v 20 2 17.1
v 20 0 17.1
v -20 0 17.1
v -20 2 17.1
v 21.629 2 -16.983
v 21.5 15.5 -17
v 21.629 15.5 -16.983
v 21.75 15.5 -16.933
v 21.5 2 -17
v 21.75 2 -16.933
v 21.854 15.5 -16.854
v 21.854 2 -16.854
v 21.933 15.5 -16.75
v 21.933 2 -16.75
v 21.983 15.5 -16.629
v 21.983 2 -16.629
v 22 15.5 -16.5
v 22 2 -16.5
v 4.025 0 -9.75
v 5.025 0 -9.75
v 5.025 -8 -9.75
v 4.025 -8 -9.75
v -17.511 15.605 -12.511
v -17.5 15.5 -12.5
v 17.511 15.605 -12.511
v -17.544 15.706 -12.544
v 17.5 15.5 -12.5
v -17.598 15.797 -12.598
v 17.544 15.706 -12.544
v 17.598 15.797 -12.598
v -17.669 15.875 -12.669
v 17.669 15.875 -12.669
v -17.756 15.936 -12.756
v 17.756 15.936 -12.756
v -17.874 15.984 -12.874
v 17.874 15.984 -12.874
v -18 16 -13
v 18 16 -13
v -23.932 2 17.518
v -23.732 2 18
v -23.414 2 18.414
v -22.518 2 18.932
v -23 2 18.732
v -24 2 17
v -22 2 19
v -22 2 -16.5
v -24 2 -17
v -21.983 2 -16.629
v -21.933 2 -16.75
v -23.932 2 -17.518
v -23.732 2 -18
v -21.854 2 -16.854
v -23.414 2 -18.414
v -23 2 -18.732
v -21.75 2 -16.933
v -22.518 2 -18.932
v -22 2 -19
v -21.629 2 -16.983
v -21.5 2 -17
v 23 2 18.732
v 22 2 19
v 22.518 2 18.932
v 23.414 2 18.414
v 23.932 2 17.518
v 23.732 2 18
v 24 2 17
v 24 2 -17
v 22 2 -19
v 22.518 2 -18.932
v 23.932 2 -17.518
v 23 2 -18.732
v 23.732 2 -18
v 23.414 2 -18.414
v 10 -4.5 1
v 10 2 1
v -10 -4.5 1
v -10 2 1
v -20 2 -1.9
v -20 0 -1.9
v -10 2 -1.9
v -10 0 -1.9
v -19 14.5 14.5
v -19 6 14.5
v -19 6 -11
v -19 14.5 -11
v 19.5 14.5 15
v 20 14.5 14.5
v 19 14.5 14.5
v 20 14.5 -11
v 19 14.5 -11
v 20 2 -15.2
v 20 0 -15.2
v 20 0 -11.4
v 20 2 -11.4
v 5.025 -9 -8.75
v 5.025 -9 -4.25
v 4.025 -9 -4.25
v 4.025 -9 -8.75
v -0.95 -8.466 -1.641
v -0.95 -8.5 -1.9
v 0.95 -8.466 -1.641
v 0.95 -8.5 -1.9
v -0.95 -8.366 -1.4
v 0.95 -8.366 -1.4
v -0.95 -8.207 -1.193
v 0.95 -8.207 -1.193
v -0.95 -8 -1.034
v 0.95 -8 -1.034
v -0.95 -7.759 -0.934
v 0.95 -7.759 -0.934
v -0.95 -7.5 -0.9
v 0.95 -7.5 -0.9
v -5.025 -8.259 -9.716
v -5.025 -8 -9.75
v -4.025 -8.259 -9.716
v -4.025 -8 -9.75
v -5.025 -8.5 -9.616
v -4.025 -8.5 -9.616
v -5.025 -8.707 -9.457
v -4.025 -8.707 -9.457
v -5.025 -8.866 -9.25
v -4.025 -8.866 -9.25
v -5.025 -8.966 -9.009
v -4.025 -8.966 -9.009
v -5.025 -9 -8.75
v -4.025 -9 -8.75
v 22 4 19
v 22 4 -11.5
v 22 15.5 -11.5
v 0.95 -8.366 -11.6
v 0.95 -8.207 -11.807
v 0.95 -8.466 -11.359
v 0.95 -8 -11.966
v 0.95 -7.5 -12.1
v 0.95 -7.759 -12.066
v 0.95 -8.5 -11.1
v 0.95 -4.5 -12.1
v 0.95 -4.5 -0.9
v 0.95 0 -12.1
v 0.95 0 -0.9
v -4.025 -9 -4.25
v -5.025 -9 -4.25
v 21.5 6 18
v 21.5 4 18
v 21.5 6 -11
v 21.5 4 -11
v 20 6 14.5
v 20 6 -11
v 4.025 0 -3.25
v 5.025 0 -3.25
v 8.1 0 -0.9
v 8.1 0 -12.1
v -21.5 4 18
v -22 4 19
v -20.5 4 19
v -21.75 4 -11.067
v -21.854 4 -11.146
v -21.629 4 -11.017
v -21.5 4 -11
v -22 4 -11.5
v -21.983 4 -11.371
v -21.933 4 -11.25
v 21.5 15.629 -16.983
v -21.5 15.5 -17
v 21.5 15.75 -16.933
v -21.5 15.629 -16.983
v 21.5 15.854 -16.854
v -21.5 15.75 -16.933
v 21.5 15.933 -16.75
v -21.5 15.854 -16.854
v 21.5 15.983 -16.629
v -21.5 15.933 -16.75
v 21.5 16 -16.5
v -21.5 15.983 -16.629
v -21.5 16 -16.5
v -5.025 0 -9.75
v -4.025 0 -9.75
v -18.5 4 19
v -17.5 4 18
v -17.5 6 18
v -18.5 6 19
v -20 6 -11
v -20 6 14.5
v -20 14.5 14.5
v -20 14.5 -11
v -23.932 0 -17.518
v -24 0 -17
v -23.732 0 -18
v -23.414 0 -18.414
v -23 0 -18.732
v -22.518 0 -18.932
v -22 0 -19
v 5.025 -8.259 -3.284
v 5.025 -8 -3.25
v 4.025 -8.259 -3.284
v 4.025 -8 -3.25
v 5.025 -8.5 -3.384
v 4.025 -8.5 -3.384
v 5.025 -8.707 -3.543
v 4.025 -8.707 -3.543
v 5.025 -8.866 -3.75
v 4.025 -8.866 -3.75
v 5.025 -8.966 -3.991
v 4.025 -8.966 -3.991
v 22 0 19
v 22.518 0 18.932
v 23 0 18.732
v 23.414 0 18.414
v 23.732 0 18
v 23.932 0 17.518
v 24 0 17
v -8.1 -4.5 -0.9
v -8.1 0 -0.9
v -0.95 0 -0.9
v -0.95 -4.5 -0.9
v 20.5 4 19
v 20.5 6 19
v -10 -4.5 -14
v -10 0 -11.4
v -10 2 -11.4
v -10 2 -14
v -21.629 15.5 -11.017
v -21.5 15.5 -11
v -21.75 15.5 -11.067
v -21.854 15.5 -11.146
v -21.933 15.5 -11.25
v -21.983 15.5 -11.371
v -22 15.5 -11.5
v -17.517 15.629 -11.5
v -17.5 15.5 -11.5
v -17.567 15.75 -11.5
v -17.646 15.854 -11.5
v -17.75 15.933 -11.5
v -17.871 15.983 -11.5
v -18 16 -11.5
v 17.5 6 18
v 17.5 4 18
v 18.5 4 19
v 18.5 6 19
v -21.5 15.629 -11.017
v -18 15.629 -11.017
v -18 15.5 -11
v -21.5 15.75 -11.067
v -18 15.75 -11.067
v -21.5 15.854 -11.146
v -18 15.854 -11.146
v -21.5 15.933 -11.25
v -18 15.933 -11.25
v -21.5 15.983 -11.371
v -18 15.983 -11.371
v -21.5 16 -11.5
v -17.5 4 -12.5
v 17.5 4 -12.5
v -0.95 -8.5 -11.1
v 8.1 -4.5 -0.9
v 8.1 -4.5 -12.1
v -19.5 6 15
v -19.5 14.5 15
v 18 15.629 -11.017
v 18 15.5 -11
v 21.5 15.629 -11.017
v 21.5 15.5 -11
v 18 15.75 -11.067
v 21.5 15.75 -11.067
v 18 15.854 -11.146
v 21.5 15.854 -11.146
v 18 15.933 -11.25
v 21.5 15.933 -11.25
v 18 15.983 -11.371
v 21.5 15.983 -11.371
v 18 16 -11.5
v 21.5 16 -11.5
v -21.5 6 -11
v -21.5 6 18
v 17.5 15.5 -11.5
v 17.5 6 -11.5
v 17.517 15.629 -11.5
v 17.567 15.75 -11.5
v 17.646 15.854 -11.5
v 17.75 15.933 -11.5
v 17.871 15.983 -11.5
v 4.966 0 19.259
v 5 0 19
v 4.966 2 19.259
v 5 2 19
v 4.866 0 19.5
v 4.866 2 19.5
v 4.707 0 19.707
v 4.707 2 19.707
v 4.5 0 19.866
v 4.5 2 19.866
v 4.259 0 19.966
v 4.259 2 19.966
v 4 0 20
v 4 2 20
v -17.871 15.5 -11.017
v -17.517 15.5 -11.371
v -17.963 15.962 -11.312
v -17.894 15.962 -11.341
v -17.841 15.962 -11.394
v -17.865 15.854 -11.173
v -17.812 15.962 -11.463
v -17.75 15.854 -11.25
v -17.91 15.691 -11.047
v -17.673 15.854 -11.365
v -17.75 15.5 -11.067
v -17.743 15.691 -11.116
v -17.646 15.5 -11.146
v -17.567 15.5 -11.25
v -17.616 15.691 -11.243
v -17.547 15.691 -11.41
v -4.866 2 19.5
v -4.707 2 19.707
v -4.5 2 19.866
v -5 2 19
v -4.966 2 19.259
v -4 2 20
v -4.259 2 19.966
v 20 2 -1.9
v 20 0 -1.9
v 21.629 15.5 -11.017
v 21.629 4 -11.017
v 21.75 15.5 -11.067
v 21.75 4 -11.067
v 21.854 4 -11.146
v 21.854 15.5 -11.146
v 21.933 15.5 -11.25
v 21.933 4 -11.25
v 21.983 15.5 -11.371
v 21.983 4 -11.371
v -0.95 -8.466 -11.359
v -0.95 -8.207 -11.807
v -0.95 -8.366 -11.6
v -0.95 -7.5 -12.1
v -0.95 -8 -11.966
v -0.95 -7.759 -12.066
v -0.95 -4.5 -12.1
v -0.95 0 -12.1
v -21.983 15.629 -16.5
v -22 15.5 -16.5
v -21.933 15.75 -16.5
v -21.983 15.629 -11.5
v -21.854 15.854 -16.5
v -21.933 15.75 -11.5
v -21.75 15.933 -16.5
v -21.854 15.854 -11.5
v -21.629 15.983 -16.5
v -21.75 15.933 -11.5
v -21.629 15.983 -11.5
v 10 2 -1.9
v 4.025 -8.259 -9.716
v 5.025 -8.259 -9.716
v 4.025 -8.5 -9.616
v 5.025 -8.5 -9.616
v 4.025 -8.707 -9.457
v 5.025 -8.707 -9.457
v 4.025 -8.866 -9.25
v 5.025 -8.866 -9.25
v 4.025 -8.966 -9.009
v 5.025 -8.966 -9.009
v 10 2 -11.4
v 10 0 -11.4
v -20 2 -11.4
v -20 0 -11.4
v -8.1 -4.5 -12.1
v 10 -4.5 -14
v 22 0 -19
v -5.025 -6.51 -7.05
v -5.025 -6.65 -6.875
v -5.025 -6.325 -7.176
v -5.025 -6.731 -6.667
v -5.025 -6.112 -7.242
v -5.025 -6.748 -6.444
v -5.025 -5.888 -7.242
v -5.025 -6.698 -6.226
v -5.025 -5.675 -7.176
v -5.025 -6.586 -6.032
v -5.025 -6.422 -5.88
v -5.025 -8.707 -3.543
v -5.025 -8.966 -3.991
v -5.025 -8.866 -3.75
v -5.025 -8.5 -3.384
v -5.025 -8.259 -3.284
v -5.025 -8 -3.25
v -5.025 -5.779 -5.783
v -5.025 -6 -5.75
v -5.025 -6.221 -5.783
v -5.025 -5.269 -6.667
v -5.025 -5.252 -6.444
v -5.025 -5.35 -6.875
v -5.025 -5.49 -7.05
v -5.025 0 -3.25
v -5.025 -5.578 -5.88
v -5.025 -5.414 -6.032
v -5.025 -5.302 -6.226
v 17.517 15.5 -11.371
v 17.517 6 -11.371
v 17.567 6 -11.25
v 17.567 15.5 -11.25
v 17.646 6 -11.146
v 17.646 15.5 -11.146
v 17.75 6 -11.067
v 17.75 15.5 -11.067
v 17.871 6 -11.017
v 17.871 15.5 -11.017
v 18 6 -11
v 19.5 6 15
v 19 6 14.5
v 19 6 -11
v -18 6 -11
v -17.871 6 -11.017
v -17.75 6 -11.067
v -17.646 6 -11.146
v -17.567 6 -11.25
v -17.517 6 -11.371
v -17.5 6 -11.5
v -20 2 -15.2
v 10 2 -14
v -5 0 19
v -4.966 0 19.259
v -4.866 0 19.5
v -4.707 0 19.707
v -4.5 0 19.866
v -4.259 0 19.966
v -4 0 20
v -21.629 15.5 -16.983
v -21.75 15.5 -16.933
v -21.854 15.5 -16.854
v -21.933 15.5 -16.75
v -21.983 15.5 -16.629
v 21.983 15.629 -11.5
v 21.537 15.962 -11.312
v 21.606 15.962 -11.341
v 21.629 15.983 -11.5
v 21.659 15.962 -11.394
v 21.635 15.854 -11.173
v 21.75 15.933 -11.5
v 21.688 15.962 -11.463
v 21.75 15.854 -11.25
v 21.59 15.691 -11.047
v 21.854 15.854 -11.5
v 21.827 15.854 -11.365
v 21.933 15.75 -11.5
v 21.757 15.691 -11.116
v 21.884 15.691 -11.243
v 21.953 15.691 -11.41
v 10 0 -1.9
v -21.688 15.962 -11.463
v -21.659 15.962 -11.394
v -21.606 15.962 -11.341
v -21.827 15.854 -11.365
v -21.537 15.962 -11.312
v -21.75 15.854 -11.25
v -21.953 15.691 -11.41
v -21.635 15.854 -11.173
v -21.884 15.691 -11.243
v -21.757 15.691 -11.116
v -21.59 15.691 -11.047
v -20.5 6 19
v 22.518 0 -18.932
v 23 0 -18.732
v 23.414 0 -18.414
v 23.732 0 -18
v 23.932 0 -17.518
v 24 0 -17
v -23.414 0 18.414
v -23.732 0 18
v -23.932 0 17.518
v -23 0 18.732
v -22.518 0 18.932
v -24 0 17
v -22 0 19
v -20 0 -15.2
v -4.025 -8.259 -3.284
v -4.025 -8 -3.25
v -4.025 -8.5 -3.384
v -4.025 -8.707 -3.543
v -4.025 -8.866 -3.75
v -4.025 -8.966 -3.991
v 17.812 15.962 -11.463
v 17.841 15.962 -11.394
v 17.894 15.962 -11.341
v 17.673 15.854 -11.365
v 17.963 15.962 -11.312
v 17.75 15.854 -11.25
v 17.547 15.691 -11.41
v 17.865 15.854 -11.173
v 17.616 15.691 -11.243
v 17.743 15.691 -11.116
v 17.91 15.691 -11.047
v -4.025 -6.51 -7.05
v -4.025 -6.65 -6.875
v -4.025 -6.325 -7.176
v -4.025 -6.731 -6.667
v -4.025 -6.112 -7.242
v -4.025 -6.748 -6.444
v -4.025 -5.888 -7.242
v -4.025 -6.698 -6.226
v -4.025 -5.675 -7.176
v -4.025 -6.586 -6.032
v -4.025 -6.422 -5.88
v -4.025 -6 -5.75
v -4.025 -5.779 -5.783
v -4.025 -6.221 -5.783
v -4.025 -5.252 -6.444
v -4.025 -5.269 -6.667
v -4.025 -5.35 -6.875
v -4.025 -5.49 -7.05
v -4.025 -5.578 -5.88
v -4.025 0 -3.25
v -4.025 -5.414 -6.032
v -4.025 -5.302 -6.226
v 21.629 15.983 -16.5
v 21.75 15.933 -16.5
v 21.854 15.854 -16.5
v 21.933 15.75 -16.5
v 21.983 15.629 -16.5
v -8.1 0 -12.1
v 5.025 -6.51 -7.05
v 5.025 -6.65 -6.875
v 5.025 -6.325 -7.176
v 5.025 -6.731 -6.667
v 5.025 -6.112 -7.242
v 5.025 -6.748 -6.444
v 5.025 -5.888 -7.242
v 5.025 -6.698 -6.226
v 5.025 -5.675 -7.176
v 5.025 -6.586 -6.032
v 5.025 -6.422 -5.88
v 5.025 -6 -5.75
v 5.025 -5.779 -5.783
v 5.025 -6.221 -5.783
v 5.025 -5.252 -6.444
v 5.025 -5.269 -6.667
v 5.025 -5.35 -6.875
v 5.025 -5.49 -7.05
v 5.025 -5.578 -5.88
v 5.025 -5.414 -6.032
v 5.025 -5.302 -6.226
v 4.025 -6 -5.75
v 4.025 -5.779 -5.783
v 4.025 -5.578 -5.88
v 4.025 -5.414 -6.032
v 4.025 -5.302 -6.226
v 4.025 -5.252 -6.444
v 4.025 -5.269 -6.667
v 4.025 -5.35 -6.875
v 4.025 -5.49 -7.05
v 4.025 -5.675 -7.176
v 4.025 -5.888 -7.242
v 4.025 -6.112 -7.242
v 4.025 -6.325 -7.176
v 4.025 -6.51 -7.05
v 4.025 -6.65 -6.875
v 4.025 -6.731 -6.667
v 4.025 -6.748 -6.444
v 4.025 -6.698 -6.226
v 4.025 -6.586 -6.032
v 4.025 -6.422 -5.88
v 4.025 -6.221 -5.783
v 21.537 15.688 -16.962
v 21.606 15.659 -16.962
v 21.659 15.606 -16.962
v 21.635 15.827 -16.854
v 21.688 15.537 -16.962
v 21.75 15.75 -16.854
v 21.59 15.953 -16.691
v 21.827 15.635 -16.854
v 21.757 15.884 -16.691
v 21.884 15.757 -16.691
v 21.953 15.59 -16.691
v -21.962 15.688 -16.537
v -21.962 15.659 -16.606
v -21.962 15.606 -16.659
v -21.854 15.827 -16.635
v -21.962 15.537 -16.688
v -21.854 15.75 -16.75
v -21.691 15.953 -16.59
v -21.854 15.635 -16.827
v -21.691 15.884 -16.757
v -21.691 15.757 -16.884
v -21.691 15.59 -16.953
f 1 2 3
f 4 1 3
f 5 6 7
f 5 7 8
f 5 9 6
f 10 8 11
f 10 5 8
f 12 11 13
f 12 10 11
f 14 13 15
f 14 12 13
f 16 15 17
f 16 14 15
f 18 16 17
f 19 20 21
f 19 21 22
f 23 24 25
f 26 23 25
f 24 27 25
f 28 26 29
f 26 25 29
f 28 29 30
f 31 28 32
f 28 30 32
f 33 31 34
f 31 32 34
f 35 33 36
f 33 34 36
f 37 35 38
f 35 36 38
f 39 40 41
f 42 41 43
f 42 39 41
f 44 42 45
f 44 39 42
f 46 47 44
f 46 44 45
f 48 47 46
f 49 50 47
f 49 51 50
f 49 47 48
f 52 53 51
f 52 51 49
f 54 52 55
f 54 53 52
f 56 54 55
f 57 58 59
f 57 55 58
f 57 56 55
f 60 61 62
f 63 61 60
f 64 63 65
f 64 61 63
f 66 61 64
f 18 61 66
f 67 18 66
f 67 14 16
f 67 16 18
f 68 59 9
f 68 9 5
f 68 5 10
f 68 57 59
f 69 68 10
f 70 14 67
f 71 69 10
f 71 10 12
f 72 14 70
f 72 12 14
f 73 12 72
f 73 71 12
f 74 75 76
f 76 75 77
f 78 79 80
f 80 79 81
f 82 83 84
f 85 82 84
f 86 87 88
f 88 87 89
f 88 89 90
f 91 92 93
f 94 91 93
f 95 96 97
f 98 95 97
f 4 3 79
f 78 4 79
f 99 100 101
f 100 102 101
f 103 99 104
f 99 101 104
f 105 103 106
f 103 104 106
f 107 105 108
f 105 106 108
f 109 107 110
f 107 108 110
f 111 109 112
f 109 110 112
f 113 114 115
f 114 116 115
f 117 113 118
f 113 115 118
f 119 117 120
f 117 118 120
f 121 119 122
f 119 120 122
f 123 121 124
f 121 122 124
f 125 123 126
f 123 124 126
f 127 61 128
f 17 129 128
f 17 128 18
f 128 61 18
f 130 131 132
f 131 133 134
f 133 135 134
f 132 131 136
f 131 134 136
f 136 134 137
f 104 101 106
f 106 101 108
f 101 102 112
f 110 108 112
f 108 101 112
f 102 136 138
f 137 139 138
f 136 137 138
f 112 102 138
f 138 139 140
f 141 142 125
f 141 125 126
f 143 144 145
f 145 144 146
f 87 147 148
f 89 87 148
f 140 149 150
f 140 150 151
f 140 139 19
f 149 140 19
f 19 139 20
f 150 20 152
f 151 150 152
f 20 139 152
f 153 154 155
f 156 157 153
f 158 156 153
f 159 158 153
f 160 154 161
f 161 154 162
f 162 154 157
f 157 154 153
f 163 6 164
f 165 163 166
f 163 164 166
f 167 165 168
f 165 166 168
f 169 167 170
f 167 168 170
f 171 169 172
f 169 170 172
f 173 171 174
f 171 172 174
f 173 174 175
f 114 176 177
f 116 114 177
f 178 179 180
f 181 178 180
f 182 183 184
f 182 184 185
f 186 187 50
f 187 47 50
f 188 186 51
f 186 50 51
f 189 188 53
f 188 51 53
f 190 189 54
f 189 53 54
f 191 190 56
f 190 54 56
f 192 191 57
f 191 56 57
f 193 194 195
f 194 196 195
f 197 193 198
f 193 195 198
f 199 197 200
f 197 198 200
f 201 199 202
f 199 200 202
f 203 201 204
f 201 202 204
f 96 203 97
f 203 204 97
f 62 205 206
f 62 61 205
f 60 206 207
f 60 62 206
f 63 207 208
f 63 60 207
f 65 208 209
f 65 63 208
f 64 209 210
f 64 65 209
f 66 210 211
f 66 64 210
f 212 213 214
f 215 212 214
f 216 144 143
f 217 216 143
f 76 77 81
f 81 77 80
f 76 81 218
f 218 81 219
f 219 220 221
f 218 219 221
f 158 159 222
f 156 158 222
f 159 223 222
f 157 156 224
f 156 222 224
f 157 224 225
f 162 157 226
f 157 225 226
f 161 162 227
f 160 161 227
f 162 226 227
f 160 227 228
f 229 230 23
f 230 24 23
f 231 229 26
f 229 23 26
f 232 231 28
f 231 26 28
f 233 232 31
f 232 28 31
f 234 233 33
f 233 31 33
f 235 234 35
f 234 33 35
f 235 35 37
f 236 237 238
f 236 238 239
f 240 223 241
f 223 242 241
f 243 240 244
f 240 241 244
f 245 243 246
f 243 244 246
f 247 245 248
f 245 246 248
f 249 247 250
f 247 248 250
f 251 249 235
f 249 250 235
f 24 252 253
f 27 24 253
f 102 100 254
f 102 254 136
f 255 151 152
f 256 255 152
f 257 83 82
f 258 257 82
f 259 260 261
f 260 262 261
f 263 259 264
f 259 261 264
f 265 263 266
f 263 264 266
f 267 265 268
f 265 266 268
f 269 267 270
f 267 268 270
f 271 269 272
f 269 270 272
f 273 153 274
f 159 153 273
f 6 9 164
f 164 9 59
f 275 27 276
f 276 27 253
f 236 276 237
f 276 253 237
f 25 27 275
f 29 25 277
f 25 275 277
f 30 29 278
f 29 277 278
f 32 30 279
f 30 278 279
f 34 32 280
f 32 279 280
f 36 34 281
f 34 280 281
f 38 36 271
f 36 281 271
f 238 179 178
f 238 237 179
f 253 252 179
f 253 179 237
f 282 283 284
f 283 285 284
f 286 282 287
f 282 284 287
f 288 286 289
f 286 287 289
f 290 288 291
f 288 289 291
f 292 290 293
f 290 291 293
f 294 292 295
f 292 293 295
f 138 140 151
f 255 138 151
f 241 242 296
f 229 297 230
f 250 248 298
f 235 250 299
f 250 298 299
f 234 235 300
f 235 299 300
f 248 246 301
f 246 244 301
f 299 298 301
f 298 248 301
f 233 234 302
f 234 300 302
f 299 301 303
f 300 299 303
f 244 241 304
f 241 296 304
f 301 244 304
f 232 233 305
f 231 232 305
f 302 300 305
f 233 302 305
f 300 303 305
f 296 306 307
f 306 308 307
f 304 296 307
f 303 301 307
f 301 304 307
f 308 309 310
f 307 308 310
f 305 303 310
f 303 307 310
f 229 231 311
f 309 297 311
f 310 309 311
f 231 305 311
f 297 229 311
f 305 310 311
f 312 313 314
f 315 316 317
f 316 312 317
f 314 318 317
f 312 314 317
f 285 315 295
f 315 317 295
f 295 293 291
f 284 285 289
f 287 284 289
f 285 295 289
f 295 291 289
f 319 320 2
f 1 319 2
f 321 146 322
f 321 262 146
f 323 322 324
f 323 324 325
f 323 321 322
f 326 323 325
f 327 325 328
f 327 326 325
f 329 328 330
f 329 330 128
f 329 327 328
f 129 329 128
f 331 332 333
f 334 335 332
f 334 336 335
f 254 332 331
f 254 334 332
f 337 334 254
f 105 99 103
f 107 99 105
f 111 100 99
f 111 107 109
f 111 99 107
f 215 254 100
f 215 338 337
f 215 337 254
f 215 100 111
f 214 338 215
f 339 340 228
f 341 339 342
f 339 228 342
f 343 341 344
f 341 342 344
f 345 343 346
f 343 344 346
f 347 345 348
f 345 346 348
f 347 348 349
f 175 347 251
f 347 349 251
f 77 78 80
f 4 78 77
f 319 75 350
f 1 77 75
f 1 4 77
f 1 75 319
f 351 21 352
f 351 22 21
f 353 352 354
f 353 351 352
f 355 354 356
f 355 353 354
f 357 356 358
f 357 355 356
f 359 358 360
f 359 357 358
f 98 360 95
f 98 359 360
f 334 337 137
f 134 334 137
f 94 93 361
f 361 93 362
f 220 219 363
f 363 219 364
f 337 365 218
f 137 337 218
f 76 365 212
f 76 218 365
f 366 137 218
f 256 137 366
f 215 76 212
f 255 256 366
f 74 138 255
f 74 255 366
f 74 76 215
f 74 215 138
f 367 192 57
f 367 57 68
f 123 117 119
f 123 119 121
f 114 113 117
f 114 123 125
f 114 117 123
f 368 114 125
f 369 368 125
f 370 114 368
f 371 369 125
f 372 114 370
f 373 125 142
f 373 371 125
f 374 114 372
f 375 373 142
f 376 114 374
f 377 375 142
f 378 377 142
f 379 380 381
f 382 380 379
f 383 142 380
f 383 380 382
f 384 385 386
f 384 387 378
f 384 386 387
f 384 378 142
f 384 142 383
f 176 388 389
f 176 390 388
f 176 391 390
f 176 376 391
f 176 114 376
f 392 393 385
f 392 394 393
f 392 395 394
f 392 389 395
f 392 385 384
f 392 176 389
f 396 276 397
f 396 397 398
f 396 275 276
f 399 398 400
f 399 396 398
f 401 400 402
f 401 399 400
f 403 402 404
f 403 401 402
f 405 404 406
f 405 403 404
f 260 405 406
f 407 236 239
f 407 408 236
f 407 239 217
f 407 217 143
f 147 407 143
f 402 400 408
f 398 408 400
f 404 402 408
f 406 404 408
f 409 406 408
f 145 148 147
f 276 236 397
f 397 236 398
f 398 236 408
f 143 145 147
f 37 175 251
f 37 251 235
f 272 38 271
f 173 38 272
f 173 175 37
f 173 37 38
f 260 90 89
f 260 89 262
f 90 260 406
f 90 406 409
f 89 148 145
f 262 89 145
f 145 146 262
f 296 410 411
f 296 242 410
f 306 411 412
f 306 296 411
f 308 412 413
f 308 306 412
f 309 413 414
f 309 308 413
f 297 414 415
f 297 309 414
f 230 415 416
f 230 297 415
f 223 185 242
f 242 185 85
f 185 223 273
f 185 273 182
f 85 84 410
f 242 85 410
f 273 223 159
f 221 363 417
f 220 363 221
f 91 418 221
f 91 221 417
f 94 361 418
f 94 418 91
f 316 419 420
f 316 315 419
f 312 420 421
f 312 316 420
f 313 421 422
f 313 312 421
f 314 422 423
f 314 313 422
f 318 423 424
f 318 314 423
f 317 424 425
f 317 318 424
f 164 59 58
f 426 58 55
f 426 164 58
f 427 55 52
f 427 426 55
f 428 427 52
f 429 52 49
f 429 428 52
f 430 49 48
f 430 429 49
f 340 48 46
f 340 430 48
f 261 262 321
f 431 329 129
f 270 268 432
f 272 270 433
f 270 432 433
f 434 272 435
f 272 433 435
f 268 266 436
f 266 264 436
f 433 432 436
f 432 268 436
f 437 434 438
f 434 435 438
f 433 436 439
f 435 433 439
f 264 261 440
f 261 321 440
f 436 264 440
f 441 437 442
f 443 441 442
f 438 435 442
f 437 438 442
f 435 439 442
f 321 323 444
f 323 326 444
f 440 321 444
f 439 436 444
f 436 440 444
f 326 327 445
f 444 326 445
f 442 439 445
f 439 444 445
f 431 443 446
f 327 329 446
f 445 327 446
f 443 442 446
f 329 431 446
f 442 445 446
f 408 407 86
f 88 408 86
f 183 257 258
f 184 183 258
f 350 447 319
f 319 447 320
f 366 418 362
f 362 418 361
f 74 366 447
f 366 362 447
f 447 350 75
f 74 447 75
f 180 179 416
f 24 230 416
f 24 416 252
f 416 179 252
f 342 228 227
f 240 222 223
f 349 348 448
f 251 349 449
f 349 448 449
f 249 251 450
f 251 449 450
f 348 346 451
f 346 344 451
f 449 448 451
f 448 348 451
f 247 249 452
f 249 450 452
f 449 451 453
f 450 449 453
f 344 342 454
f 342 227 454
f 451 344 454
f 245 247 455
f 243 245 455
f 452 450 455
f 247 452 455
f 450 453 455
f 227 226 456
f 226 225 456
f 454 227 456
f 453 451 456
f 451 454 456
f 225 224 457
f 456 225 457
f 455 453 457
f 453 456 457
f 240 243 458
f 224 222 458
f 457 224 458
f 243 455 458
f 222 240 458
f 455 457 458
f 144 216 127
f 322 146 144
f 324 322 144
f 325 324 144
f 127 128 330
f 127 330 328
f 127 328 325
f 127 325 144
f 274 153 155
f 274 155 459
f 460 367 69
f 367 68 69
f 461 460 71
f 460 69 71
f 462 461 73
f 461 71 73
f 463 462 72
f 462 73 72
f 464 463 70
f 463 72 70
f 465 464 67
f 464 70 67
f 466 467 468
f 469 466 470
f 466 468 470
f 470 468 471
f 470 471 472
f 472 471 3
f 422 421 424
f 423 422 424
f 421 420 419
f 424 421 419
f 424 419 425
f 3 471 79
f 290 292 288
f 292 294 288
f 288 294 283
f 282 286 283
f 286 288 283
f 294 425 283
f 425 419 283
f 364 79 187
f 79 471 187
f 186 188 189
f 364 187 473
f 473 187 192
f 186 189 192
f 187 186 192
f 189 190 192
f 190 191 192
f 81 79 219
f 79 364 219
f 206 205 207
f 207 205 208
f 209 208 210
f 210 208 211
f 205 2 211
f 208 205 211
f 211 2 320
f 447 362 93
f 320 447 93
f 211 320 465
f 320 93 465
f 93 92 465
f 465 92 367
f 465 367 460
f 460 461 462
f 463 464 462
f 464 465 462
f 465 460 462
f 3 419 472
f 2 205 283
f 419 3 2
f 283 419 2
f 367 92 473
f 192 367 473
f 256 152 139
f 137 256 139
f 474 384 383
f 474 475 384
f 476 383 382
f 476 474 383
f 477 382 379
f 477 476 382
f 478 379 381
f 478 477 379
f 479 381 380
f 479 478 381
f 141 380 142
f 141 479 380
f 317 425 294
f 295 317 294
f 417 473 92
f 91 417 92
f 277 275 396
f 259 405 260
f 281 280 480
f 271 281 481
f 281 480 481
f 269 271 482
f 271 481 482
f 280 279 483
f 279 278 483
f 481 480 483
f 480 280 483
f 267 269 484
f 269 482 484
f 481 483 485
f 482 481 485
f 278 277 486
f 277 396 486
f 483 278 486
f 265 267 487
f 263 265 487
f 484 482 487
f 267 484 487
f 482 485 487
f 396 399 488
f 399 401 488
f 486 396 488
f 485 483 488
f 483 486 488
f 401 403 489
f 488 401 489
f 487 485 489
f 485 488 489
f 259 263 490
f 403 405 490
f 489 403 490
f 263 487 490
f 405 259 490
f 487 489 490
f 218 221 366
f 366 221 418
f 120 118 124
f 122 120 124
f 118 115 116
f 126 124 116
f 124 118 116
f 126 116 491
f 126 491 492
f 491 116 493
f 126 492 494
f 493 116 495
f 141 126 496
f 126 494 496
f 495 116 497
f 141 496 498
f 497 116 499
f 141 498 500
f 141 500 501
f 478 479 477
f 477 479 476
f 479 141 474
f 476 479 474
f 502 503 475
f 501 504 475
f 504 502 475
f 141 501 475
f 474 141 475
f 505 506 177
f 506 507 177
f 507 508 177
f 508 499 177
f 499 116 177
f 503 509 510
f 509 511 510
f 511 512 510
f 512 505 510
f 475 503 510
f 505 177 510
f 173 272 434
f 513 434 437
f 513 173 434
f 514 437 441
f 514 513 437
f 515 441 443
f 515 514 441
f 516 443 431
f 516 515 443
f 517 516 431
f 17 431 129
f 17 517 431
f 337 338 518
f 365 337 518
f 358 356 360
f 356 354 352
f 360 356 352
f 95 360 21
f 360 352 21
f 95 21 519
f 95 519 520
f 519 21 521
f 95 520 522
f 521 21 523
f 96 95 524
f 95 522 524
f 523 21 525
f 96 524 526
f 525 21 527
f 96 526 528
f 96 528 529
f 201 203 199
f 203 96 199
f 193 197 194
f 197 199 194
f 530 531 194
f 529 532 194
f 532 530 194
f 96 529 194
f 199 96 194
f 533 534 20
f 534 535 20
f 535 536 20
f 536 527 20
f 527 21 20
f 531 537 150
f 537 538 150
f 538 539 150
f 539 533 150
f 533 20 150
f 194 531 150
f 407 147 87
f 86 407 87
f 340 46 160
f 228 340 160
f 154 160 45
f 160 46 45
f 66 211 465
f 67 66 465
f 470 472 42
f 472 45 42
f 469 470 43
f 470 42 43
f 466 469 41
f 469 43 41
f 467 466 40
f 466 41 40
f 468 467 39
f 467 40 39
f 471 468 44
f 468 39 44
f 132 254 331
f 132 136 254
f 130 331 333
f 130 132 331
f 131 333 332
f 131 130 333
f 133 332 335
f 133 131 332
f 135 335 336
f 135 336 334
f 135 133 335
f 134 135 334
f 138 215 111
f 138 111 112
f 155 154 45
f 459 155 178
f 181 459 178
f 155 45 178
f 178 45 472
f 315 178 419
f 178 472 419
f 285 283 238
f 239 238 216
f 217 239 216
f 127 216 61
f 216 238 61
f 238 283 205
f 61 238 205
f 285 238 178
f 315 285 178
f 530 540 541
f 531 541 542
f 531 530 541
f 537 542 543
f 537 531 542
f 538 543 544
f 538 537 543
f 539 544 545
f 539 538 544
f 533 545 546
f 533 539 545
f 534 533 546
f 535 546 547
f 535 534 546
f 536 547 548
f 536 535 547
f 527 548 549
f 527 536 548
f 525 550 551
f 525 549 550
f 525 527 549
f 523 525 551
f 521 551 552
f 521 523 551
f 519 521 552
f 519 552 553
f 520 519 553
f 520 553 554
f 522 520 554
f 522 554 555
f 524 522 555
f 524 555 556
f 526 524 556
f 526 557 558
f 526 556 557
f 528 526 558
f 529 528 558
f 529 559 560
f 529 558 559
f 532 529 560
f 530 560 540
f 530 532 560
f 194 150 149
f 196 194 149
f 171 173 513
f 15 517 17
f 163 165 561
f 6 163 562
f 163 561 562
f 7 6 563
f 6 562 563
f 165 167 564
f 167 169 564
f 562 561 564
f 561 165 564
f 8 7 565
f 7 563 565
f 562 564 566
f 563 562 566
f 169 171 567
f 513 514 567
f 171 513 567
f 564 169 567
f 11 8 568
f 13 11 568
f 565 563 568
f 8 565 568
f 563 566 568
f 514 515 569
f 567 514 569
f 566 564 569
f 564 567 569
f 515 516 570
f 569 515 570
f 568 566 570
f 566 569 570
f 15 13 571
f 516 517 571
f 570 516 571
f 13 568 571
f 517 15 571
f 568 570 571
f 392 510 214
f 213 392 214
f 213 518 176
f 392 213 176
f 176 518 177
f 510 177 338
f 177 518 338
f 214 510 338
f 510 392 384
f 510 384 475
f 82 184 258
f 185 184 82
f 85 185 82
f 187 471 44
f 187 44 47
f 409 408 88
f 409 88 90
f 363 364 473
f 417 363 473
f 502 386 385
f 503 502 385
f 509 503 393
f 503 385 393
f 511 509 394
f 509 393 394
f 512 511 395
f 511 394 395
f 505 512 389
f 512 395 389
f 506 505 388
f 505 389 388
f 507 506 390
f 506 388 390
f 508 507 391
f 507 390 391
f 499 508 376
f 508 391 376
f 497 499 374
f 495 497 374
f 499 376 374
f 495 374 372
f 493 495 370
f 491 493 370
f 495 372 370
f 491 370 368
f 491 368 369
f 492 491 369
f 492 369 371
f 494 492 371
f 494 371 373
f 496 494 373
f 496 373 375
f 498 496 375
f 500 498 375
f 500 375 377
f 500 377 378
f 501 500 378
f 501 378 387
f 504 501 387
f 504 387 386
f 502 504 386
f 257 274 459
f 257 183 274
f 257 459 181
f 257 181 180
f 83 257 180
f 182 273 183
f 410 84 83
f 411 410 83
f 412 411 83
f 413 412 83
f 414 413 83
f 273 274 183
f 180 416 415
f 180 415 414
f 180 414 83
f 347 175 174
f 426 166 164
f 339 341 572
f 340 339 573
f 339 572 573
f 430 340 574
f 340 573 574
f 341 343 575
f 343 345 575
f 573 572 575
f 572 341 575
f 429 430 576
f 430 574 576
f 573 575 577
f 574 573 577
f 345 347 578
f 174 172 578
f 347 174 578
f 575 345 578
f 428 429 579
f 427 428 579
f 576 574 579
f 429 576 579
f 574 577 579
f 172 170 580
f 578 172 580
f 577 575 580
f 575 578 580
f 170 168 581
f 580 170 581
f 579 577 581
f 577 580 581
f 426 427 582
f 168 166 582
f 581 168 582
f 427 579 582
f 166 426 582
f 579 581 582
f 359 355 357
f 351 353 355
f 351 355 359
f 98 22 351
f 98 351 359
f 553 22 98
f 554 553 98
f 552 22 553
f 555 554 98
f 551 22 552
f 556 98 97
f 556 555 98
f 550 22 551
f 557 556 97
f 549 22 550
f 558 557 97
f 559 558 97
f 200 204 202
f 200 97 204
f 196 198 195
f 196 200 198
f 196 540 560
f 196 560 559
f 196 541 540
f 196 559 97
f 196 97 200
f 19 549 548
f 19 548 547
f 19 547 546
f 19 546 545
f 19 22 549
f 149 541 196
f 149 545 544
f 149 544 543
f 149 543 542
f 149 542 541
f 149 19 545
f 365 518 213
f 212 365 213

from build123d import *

# Parameters (mm, degrees)
SKETCH1_W                = 48
SKETCH1_H                = 38
BOSS_EXTRUDE1_DEPTH      = 2
SKETCH2_W                = 44
SKETCH2_H                = 36
BOSS_EXTRUDE2_DEPTH      = 2
SKETCH3_W                = 4
SKETCH3_H                = 30
BOSS_EXTRUDE3_DEPTH      = 2
CHAMFER1_SIZE            = 1
BOSS_EXTRUDE4_DEPTH      = 12
FILLET1_R                = 0.5
SKETCH5_W                = 1
SKETCH5_H                = 26
BOSS_EXTRUDE5_DEPTH      = 8.5
CHAMFER2_SIZE            = 0.5
CHAMFER2_OF_MIRROR1_SIZE = 0.5
SKETCH6_W                = 10
SKETCH6_H                = 1
BOSS_EXTRUDE6_DEPTH      = 2
FILLET2_R                = 1
SKETCH7_W                = 0.95
SKETCH7_H                = 1.9
SKETCH7_H_2              = 11.2
BOSS_EXTRUDE7_DEPTH      = 4.5
SKETCH8_W                = 1.9
SKETCH8_H                = 11.2
BOSS_EXTRUDE8_DEPTH      = 4
SKETCH9_W                = 1
SKETCH9_H                = 6.5
BOSS_EXTRUDE9_DEPTH      = 9
FILLET3_R                = 1
SKETCH10_R               = 0.75
CUT_EXTRUDE1_DEPTH       = 2
FILLET3_OF_MIRROR2_R     = 1
CUT_EXTRUDE2_DEPTH       = 2
FILLET4_R                = 1
FILLET5_R                = 2


with BuildPart() as part:
    # Sketch1 → Boss-Extrude1 (new body)
    with BuildSketch(Plane(origin=(0, 0, 0), x_dir=(1, 0, 0), z_dir=(0, 1, 0))):
        Rectangle(SKETCH1_W, SKETCH1_H)
    extrude(amount=BOSS_EXTRUDE1_DEPTH)

    # Sketch2 → Boss-Extrude2 (add)
    with BuildSketch(Plane(origin=(0, 2, 0), x_dir=(1, 0, 0), z_dir=(0, 1, 0))):
        with Locations((0, -1)):
            Rectangle(SKETCH2_W, SKETCH2_H)
    extrude(amount=BOSS_EXTRUDE2_DEPTH)

    # Sketch3 → Boss-Extrude3 (add)
    with BuildSketch(Plane(origin=(0, 4, 0), x_dir=(1, 0, 0), z_dir=(0, 1, 0))):
        with Locations((-19.5, -4)):
            Rectangle(SKETCH3_W, SKETCH3_H)
        with Locations((19.5, -4)):
            Rectangle(SKETCH3_W, SKETCH3_H)
    extrude(amount=BOSS_EXTRUDE3_DEPTH)

    # Chamfer1
    chamfer1_edges = [part.edges().sort_by_distance(p)[0] for p in [
        (-21.5, 5, 19),
        (-17.5, 5, 19),
        (17.5, 5, 19),
        (21.5, 5, 19),
    ]]
    chamfer(chamfer1_edges, length=CHAMFER1_SIZE)

    # Sketch4 → Boss-Extrude4 (add)
    with BuildSketch(Plane(origin=(0, 4, 0), x_dir=(1, 0, 0), z_dir=(0, 1, 0))):
        Polygon((22, 17), (-22, 17), (-22, 11), (-21.5, 11), (-17.5, 11), (-17.5, 12.5), (17.5, 12.5), (17.5, 11), (21.5, 11), (22, 11), align=None)
    extrude(amount=BOSS_EXTRUDE4_DEPTH)

    # Fillet1
    fillet1_edges = [part.edges().sort_by_distance(p)[0] for p in [
        (17.5, 11, -11),
        (17.5, 16, -11.75),
        (22, 10, -11),
        (-22, 10, -11),
        (-17.5, 11, -11),
        (19.75, 16, -11),
        (22, 16, -14),
        (0, 16, -17),
        (-22, 16, -14),
        (-19.75, 16, -11),
        (-17.5, 16, -11.75),
        (0, 16, -12.5),
        (-22, 9, -17),
        (22, 9, -17),
    ]]
    fillet(fillet1_edges, radius=FILLET1_R - 0.0001)  # a hair under: the kernel refuses the full size

    # Sketch5 → Boss-Extrude5 (add)
    with BuildSketch(Plane(origin=(0, 6, 0), x_dir=(1, 0, 0), z_dir=(0, 1, 0))):
        with Locations((-19.5, -2)):
            Rectangle(SKETCH5_W, SKETCH5_H)
    boss_extrude5 = extrude(amount=BOSS_EXTRUDE5_DEPTH)

    # Chamfer2
    chamfer2_edges = [part.edges().sort_by_distance(p)[0] for p in [
        (-19, 10.25, 15),
        (-20, 10.25, 15),
    ]]
    chamfer(chamfer2_edges, length=CHAMFER2_SIZE - 0.0001)  # a hair under: the kernel refuses the full size

    # Mirror1: Boss-Extrude5 across plane
    add(boss_extrude5.mirror(Plane.ZY))

    # Chamfer2 of Mirror1
    chamfer2_of_mirror1_edges = [part.edges().sort_by_distance(p)[0] for p in [
        (19, 10.25, 15),
        (20, 10.25, 15),
    ]]
    chamfer(chamfer2_of_mirror1_edges, length=CHAMFER2_OF_MIRROR1_SIZE - 0.0001)  # a hair under: the kernel refuses the full size

    # Sketch6 → Boss-Extrude6 (add)
    with BuildSketch(Plane.XZ):
        with Locations((0, 19.5)):
            Rectangle(SKETCH6_W, SKETCH6_H)
    extrude(amount=-BOSS_EXTRUDE6_DEPTH)

    # Fillet2
    fillet2_edges = [part.edges().sort_by_distance(p)[0] for p in [
        (-5, 1, 20),
        (5, 1, 20),
    ]]
    fillet(fillet2_edges, radius=FILLET2_R - 0.0001)  # a hair under: the kernel refuses the full size

    # Sketch7 → Boss-Extrude7 (add)
    with BuildSketch(Plane.XZ):
        Polygon((-10, -14), (-0.95, -14), (-0.95, -12.1), (-8.1, -12.1), (-8.1, -0.9), (-0.95, -0.9), (-0.95, 1), (-10, 1), align=None)
        with Locations((-0.475, -13.05)):
            Rectangle(SKETCH7_W, SKETCH7_H)
        with Locations((0.475, -13.05)):
            Rectangle(SKETCH7_W, SKETCH7_H)
        Polygon((0.95, -14), (10, -14), (10, 1), (0.95, 1), (0.95, -0.9), (8.1, -0.9), (8.1, -12.1), (0.95, -12.1), align=None)
        with Locations((-0.475, -6.5)):
            Rectangle(SKETCH7_W, SKETCH7_H_2)
        with Locations((0.475, -6.5)):
            Rectangle(SKETCH7_W, SKETCH7_H_2)
        with Locations((-0.475, 0.05)):
            Rectangle(SKETCH7_W, SKETCH7_H)
        with Locations((0.475, 0.05)):
            Rectangle(SKETCH7_W, SKETCH7_H)
    extrude(amount=BOSS_EXTRUDE7_DEPTH)

    # Sketch8 → Boss-Extrude8 (add)
    with BuildSketch(Plane.XZ.offset(4.5)):
        with Locations((0, -6.5)):
            Rectangle(SKETCH8_W, SKETCH8_H)
    extrude(amount=BOSS_EXTRUDE8_DEPTH)

    # Sketch9 → Boss-Extrude9 (add)
    with BuildSketch(Plane.XZ):
        with Locations((-4.525, -6.5)):
            Rectangle(SKETCH9_W, SKETCH9_H)
    boss_extrude9 = extrude(amount=BOSS_EXTRUDE9_DEPTH)

    # Fillet3
    fillet3_edges = [part.edges().sort_by_distance(p)[0] for p in [
        (-4.525, -9, -3.25),
        (-4.525, -9, -9.75),
    ]]
    fillet(fillet3_edges, radius=FILLET3_R)

    # Sketch10 → Cut-Extrude1 (cut)
    with BuildSketch(Plane.ZY.offset(5.025)):
        with Locations((-6.5, -6)):
            Circle(SKETCH10_R)
    cut_extrude1 = extrude(amount=-CUT_EXTRUDE1_DEPTH, mode=Mode.SUBTRACT)

    # Mirror2: Boss-Extrude9, Cut-Extrude1 across plane
    add(boss_extrude9.mirror(Plane.ZY))
    add(cut_extrude1.mirror(Plane.ZY), mode=Mode.SUBTRACT)

    # Fillet3 of Mirror2
    fillet3_of_mirror2_edges = [part.edges().sort_by_distance(p)[0] for p in [
        (4.525, -9, -3.25),
        (4.525, -9, -9.75),
    ]]
    fillet(fillet3_of_mirror2_edges, radius=FILLET3_OF_MIRROR2_R)

    # Sketch11 → Cut-Extrude2 (cut)
    with BuildSketch(Plane.XZ):
        Polygon((20, -11.4), (10, -11.4), (10, -14), (-10, -14), (-10, -11.4), (-20, -11.4), (-20, -15.2), (20, -15.2), align=None)
        Polygon((10, -1.9), (20, -1.9), (20, 17.1), (-20, 17.1), (-20, -1.9), (-10, -1.9), (-10, 1), (10, 1), align=None)
    extrude(amount=-CUT_EXTRUDE2_DEPTH, mode=Mode.SUBTRACT)

    # Fillet4
    fillet4_edges = [part.edges().sort_by_distance(p)[0] for p in [
        (0, -8.5, -12.1),
        (0, -8.5, -0.9),
    ]]
    fillet(fillet4_edges, radius=FILLET4_R)

    # Fillet5
    fillet5_edges = [part.edges().sort_by_distance(p)[0] for p in [
        (-24, 1, -19),
        (-24, 1, 19),
        (24, 1, 19),
        (24, 1, -19),
    ]]
    fillet(fillet5_edges, radius=FILLET5_R)


solid = part.part
